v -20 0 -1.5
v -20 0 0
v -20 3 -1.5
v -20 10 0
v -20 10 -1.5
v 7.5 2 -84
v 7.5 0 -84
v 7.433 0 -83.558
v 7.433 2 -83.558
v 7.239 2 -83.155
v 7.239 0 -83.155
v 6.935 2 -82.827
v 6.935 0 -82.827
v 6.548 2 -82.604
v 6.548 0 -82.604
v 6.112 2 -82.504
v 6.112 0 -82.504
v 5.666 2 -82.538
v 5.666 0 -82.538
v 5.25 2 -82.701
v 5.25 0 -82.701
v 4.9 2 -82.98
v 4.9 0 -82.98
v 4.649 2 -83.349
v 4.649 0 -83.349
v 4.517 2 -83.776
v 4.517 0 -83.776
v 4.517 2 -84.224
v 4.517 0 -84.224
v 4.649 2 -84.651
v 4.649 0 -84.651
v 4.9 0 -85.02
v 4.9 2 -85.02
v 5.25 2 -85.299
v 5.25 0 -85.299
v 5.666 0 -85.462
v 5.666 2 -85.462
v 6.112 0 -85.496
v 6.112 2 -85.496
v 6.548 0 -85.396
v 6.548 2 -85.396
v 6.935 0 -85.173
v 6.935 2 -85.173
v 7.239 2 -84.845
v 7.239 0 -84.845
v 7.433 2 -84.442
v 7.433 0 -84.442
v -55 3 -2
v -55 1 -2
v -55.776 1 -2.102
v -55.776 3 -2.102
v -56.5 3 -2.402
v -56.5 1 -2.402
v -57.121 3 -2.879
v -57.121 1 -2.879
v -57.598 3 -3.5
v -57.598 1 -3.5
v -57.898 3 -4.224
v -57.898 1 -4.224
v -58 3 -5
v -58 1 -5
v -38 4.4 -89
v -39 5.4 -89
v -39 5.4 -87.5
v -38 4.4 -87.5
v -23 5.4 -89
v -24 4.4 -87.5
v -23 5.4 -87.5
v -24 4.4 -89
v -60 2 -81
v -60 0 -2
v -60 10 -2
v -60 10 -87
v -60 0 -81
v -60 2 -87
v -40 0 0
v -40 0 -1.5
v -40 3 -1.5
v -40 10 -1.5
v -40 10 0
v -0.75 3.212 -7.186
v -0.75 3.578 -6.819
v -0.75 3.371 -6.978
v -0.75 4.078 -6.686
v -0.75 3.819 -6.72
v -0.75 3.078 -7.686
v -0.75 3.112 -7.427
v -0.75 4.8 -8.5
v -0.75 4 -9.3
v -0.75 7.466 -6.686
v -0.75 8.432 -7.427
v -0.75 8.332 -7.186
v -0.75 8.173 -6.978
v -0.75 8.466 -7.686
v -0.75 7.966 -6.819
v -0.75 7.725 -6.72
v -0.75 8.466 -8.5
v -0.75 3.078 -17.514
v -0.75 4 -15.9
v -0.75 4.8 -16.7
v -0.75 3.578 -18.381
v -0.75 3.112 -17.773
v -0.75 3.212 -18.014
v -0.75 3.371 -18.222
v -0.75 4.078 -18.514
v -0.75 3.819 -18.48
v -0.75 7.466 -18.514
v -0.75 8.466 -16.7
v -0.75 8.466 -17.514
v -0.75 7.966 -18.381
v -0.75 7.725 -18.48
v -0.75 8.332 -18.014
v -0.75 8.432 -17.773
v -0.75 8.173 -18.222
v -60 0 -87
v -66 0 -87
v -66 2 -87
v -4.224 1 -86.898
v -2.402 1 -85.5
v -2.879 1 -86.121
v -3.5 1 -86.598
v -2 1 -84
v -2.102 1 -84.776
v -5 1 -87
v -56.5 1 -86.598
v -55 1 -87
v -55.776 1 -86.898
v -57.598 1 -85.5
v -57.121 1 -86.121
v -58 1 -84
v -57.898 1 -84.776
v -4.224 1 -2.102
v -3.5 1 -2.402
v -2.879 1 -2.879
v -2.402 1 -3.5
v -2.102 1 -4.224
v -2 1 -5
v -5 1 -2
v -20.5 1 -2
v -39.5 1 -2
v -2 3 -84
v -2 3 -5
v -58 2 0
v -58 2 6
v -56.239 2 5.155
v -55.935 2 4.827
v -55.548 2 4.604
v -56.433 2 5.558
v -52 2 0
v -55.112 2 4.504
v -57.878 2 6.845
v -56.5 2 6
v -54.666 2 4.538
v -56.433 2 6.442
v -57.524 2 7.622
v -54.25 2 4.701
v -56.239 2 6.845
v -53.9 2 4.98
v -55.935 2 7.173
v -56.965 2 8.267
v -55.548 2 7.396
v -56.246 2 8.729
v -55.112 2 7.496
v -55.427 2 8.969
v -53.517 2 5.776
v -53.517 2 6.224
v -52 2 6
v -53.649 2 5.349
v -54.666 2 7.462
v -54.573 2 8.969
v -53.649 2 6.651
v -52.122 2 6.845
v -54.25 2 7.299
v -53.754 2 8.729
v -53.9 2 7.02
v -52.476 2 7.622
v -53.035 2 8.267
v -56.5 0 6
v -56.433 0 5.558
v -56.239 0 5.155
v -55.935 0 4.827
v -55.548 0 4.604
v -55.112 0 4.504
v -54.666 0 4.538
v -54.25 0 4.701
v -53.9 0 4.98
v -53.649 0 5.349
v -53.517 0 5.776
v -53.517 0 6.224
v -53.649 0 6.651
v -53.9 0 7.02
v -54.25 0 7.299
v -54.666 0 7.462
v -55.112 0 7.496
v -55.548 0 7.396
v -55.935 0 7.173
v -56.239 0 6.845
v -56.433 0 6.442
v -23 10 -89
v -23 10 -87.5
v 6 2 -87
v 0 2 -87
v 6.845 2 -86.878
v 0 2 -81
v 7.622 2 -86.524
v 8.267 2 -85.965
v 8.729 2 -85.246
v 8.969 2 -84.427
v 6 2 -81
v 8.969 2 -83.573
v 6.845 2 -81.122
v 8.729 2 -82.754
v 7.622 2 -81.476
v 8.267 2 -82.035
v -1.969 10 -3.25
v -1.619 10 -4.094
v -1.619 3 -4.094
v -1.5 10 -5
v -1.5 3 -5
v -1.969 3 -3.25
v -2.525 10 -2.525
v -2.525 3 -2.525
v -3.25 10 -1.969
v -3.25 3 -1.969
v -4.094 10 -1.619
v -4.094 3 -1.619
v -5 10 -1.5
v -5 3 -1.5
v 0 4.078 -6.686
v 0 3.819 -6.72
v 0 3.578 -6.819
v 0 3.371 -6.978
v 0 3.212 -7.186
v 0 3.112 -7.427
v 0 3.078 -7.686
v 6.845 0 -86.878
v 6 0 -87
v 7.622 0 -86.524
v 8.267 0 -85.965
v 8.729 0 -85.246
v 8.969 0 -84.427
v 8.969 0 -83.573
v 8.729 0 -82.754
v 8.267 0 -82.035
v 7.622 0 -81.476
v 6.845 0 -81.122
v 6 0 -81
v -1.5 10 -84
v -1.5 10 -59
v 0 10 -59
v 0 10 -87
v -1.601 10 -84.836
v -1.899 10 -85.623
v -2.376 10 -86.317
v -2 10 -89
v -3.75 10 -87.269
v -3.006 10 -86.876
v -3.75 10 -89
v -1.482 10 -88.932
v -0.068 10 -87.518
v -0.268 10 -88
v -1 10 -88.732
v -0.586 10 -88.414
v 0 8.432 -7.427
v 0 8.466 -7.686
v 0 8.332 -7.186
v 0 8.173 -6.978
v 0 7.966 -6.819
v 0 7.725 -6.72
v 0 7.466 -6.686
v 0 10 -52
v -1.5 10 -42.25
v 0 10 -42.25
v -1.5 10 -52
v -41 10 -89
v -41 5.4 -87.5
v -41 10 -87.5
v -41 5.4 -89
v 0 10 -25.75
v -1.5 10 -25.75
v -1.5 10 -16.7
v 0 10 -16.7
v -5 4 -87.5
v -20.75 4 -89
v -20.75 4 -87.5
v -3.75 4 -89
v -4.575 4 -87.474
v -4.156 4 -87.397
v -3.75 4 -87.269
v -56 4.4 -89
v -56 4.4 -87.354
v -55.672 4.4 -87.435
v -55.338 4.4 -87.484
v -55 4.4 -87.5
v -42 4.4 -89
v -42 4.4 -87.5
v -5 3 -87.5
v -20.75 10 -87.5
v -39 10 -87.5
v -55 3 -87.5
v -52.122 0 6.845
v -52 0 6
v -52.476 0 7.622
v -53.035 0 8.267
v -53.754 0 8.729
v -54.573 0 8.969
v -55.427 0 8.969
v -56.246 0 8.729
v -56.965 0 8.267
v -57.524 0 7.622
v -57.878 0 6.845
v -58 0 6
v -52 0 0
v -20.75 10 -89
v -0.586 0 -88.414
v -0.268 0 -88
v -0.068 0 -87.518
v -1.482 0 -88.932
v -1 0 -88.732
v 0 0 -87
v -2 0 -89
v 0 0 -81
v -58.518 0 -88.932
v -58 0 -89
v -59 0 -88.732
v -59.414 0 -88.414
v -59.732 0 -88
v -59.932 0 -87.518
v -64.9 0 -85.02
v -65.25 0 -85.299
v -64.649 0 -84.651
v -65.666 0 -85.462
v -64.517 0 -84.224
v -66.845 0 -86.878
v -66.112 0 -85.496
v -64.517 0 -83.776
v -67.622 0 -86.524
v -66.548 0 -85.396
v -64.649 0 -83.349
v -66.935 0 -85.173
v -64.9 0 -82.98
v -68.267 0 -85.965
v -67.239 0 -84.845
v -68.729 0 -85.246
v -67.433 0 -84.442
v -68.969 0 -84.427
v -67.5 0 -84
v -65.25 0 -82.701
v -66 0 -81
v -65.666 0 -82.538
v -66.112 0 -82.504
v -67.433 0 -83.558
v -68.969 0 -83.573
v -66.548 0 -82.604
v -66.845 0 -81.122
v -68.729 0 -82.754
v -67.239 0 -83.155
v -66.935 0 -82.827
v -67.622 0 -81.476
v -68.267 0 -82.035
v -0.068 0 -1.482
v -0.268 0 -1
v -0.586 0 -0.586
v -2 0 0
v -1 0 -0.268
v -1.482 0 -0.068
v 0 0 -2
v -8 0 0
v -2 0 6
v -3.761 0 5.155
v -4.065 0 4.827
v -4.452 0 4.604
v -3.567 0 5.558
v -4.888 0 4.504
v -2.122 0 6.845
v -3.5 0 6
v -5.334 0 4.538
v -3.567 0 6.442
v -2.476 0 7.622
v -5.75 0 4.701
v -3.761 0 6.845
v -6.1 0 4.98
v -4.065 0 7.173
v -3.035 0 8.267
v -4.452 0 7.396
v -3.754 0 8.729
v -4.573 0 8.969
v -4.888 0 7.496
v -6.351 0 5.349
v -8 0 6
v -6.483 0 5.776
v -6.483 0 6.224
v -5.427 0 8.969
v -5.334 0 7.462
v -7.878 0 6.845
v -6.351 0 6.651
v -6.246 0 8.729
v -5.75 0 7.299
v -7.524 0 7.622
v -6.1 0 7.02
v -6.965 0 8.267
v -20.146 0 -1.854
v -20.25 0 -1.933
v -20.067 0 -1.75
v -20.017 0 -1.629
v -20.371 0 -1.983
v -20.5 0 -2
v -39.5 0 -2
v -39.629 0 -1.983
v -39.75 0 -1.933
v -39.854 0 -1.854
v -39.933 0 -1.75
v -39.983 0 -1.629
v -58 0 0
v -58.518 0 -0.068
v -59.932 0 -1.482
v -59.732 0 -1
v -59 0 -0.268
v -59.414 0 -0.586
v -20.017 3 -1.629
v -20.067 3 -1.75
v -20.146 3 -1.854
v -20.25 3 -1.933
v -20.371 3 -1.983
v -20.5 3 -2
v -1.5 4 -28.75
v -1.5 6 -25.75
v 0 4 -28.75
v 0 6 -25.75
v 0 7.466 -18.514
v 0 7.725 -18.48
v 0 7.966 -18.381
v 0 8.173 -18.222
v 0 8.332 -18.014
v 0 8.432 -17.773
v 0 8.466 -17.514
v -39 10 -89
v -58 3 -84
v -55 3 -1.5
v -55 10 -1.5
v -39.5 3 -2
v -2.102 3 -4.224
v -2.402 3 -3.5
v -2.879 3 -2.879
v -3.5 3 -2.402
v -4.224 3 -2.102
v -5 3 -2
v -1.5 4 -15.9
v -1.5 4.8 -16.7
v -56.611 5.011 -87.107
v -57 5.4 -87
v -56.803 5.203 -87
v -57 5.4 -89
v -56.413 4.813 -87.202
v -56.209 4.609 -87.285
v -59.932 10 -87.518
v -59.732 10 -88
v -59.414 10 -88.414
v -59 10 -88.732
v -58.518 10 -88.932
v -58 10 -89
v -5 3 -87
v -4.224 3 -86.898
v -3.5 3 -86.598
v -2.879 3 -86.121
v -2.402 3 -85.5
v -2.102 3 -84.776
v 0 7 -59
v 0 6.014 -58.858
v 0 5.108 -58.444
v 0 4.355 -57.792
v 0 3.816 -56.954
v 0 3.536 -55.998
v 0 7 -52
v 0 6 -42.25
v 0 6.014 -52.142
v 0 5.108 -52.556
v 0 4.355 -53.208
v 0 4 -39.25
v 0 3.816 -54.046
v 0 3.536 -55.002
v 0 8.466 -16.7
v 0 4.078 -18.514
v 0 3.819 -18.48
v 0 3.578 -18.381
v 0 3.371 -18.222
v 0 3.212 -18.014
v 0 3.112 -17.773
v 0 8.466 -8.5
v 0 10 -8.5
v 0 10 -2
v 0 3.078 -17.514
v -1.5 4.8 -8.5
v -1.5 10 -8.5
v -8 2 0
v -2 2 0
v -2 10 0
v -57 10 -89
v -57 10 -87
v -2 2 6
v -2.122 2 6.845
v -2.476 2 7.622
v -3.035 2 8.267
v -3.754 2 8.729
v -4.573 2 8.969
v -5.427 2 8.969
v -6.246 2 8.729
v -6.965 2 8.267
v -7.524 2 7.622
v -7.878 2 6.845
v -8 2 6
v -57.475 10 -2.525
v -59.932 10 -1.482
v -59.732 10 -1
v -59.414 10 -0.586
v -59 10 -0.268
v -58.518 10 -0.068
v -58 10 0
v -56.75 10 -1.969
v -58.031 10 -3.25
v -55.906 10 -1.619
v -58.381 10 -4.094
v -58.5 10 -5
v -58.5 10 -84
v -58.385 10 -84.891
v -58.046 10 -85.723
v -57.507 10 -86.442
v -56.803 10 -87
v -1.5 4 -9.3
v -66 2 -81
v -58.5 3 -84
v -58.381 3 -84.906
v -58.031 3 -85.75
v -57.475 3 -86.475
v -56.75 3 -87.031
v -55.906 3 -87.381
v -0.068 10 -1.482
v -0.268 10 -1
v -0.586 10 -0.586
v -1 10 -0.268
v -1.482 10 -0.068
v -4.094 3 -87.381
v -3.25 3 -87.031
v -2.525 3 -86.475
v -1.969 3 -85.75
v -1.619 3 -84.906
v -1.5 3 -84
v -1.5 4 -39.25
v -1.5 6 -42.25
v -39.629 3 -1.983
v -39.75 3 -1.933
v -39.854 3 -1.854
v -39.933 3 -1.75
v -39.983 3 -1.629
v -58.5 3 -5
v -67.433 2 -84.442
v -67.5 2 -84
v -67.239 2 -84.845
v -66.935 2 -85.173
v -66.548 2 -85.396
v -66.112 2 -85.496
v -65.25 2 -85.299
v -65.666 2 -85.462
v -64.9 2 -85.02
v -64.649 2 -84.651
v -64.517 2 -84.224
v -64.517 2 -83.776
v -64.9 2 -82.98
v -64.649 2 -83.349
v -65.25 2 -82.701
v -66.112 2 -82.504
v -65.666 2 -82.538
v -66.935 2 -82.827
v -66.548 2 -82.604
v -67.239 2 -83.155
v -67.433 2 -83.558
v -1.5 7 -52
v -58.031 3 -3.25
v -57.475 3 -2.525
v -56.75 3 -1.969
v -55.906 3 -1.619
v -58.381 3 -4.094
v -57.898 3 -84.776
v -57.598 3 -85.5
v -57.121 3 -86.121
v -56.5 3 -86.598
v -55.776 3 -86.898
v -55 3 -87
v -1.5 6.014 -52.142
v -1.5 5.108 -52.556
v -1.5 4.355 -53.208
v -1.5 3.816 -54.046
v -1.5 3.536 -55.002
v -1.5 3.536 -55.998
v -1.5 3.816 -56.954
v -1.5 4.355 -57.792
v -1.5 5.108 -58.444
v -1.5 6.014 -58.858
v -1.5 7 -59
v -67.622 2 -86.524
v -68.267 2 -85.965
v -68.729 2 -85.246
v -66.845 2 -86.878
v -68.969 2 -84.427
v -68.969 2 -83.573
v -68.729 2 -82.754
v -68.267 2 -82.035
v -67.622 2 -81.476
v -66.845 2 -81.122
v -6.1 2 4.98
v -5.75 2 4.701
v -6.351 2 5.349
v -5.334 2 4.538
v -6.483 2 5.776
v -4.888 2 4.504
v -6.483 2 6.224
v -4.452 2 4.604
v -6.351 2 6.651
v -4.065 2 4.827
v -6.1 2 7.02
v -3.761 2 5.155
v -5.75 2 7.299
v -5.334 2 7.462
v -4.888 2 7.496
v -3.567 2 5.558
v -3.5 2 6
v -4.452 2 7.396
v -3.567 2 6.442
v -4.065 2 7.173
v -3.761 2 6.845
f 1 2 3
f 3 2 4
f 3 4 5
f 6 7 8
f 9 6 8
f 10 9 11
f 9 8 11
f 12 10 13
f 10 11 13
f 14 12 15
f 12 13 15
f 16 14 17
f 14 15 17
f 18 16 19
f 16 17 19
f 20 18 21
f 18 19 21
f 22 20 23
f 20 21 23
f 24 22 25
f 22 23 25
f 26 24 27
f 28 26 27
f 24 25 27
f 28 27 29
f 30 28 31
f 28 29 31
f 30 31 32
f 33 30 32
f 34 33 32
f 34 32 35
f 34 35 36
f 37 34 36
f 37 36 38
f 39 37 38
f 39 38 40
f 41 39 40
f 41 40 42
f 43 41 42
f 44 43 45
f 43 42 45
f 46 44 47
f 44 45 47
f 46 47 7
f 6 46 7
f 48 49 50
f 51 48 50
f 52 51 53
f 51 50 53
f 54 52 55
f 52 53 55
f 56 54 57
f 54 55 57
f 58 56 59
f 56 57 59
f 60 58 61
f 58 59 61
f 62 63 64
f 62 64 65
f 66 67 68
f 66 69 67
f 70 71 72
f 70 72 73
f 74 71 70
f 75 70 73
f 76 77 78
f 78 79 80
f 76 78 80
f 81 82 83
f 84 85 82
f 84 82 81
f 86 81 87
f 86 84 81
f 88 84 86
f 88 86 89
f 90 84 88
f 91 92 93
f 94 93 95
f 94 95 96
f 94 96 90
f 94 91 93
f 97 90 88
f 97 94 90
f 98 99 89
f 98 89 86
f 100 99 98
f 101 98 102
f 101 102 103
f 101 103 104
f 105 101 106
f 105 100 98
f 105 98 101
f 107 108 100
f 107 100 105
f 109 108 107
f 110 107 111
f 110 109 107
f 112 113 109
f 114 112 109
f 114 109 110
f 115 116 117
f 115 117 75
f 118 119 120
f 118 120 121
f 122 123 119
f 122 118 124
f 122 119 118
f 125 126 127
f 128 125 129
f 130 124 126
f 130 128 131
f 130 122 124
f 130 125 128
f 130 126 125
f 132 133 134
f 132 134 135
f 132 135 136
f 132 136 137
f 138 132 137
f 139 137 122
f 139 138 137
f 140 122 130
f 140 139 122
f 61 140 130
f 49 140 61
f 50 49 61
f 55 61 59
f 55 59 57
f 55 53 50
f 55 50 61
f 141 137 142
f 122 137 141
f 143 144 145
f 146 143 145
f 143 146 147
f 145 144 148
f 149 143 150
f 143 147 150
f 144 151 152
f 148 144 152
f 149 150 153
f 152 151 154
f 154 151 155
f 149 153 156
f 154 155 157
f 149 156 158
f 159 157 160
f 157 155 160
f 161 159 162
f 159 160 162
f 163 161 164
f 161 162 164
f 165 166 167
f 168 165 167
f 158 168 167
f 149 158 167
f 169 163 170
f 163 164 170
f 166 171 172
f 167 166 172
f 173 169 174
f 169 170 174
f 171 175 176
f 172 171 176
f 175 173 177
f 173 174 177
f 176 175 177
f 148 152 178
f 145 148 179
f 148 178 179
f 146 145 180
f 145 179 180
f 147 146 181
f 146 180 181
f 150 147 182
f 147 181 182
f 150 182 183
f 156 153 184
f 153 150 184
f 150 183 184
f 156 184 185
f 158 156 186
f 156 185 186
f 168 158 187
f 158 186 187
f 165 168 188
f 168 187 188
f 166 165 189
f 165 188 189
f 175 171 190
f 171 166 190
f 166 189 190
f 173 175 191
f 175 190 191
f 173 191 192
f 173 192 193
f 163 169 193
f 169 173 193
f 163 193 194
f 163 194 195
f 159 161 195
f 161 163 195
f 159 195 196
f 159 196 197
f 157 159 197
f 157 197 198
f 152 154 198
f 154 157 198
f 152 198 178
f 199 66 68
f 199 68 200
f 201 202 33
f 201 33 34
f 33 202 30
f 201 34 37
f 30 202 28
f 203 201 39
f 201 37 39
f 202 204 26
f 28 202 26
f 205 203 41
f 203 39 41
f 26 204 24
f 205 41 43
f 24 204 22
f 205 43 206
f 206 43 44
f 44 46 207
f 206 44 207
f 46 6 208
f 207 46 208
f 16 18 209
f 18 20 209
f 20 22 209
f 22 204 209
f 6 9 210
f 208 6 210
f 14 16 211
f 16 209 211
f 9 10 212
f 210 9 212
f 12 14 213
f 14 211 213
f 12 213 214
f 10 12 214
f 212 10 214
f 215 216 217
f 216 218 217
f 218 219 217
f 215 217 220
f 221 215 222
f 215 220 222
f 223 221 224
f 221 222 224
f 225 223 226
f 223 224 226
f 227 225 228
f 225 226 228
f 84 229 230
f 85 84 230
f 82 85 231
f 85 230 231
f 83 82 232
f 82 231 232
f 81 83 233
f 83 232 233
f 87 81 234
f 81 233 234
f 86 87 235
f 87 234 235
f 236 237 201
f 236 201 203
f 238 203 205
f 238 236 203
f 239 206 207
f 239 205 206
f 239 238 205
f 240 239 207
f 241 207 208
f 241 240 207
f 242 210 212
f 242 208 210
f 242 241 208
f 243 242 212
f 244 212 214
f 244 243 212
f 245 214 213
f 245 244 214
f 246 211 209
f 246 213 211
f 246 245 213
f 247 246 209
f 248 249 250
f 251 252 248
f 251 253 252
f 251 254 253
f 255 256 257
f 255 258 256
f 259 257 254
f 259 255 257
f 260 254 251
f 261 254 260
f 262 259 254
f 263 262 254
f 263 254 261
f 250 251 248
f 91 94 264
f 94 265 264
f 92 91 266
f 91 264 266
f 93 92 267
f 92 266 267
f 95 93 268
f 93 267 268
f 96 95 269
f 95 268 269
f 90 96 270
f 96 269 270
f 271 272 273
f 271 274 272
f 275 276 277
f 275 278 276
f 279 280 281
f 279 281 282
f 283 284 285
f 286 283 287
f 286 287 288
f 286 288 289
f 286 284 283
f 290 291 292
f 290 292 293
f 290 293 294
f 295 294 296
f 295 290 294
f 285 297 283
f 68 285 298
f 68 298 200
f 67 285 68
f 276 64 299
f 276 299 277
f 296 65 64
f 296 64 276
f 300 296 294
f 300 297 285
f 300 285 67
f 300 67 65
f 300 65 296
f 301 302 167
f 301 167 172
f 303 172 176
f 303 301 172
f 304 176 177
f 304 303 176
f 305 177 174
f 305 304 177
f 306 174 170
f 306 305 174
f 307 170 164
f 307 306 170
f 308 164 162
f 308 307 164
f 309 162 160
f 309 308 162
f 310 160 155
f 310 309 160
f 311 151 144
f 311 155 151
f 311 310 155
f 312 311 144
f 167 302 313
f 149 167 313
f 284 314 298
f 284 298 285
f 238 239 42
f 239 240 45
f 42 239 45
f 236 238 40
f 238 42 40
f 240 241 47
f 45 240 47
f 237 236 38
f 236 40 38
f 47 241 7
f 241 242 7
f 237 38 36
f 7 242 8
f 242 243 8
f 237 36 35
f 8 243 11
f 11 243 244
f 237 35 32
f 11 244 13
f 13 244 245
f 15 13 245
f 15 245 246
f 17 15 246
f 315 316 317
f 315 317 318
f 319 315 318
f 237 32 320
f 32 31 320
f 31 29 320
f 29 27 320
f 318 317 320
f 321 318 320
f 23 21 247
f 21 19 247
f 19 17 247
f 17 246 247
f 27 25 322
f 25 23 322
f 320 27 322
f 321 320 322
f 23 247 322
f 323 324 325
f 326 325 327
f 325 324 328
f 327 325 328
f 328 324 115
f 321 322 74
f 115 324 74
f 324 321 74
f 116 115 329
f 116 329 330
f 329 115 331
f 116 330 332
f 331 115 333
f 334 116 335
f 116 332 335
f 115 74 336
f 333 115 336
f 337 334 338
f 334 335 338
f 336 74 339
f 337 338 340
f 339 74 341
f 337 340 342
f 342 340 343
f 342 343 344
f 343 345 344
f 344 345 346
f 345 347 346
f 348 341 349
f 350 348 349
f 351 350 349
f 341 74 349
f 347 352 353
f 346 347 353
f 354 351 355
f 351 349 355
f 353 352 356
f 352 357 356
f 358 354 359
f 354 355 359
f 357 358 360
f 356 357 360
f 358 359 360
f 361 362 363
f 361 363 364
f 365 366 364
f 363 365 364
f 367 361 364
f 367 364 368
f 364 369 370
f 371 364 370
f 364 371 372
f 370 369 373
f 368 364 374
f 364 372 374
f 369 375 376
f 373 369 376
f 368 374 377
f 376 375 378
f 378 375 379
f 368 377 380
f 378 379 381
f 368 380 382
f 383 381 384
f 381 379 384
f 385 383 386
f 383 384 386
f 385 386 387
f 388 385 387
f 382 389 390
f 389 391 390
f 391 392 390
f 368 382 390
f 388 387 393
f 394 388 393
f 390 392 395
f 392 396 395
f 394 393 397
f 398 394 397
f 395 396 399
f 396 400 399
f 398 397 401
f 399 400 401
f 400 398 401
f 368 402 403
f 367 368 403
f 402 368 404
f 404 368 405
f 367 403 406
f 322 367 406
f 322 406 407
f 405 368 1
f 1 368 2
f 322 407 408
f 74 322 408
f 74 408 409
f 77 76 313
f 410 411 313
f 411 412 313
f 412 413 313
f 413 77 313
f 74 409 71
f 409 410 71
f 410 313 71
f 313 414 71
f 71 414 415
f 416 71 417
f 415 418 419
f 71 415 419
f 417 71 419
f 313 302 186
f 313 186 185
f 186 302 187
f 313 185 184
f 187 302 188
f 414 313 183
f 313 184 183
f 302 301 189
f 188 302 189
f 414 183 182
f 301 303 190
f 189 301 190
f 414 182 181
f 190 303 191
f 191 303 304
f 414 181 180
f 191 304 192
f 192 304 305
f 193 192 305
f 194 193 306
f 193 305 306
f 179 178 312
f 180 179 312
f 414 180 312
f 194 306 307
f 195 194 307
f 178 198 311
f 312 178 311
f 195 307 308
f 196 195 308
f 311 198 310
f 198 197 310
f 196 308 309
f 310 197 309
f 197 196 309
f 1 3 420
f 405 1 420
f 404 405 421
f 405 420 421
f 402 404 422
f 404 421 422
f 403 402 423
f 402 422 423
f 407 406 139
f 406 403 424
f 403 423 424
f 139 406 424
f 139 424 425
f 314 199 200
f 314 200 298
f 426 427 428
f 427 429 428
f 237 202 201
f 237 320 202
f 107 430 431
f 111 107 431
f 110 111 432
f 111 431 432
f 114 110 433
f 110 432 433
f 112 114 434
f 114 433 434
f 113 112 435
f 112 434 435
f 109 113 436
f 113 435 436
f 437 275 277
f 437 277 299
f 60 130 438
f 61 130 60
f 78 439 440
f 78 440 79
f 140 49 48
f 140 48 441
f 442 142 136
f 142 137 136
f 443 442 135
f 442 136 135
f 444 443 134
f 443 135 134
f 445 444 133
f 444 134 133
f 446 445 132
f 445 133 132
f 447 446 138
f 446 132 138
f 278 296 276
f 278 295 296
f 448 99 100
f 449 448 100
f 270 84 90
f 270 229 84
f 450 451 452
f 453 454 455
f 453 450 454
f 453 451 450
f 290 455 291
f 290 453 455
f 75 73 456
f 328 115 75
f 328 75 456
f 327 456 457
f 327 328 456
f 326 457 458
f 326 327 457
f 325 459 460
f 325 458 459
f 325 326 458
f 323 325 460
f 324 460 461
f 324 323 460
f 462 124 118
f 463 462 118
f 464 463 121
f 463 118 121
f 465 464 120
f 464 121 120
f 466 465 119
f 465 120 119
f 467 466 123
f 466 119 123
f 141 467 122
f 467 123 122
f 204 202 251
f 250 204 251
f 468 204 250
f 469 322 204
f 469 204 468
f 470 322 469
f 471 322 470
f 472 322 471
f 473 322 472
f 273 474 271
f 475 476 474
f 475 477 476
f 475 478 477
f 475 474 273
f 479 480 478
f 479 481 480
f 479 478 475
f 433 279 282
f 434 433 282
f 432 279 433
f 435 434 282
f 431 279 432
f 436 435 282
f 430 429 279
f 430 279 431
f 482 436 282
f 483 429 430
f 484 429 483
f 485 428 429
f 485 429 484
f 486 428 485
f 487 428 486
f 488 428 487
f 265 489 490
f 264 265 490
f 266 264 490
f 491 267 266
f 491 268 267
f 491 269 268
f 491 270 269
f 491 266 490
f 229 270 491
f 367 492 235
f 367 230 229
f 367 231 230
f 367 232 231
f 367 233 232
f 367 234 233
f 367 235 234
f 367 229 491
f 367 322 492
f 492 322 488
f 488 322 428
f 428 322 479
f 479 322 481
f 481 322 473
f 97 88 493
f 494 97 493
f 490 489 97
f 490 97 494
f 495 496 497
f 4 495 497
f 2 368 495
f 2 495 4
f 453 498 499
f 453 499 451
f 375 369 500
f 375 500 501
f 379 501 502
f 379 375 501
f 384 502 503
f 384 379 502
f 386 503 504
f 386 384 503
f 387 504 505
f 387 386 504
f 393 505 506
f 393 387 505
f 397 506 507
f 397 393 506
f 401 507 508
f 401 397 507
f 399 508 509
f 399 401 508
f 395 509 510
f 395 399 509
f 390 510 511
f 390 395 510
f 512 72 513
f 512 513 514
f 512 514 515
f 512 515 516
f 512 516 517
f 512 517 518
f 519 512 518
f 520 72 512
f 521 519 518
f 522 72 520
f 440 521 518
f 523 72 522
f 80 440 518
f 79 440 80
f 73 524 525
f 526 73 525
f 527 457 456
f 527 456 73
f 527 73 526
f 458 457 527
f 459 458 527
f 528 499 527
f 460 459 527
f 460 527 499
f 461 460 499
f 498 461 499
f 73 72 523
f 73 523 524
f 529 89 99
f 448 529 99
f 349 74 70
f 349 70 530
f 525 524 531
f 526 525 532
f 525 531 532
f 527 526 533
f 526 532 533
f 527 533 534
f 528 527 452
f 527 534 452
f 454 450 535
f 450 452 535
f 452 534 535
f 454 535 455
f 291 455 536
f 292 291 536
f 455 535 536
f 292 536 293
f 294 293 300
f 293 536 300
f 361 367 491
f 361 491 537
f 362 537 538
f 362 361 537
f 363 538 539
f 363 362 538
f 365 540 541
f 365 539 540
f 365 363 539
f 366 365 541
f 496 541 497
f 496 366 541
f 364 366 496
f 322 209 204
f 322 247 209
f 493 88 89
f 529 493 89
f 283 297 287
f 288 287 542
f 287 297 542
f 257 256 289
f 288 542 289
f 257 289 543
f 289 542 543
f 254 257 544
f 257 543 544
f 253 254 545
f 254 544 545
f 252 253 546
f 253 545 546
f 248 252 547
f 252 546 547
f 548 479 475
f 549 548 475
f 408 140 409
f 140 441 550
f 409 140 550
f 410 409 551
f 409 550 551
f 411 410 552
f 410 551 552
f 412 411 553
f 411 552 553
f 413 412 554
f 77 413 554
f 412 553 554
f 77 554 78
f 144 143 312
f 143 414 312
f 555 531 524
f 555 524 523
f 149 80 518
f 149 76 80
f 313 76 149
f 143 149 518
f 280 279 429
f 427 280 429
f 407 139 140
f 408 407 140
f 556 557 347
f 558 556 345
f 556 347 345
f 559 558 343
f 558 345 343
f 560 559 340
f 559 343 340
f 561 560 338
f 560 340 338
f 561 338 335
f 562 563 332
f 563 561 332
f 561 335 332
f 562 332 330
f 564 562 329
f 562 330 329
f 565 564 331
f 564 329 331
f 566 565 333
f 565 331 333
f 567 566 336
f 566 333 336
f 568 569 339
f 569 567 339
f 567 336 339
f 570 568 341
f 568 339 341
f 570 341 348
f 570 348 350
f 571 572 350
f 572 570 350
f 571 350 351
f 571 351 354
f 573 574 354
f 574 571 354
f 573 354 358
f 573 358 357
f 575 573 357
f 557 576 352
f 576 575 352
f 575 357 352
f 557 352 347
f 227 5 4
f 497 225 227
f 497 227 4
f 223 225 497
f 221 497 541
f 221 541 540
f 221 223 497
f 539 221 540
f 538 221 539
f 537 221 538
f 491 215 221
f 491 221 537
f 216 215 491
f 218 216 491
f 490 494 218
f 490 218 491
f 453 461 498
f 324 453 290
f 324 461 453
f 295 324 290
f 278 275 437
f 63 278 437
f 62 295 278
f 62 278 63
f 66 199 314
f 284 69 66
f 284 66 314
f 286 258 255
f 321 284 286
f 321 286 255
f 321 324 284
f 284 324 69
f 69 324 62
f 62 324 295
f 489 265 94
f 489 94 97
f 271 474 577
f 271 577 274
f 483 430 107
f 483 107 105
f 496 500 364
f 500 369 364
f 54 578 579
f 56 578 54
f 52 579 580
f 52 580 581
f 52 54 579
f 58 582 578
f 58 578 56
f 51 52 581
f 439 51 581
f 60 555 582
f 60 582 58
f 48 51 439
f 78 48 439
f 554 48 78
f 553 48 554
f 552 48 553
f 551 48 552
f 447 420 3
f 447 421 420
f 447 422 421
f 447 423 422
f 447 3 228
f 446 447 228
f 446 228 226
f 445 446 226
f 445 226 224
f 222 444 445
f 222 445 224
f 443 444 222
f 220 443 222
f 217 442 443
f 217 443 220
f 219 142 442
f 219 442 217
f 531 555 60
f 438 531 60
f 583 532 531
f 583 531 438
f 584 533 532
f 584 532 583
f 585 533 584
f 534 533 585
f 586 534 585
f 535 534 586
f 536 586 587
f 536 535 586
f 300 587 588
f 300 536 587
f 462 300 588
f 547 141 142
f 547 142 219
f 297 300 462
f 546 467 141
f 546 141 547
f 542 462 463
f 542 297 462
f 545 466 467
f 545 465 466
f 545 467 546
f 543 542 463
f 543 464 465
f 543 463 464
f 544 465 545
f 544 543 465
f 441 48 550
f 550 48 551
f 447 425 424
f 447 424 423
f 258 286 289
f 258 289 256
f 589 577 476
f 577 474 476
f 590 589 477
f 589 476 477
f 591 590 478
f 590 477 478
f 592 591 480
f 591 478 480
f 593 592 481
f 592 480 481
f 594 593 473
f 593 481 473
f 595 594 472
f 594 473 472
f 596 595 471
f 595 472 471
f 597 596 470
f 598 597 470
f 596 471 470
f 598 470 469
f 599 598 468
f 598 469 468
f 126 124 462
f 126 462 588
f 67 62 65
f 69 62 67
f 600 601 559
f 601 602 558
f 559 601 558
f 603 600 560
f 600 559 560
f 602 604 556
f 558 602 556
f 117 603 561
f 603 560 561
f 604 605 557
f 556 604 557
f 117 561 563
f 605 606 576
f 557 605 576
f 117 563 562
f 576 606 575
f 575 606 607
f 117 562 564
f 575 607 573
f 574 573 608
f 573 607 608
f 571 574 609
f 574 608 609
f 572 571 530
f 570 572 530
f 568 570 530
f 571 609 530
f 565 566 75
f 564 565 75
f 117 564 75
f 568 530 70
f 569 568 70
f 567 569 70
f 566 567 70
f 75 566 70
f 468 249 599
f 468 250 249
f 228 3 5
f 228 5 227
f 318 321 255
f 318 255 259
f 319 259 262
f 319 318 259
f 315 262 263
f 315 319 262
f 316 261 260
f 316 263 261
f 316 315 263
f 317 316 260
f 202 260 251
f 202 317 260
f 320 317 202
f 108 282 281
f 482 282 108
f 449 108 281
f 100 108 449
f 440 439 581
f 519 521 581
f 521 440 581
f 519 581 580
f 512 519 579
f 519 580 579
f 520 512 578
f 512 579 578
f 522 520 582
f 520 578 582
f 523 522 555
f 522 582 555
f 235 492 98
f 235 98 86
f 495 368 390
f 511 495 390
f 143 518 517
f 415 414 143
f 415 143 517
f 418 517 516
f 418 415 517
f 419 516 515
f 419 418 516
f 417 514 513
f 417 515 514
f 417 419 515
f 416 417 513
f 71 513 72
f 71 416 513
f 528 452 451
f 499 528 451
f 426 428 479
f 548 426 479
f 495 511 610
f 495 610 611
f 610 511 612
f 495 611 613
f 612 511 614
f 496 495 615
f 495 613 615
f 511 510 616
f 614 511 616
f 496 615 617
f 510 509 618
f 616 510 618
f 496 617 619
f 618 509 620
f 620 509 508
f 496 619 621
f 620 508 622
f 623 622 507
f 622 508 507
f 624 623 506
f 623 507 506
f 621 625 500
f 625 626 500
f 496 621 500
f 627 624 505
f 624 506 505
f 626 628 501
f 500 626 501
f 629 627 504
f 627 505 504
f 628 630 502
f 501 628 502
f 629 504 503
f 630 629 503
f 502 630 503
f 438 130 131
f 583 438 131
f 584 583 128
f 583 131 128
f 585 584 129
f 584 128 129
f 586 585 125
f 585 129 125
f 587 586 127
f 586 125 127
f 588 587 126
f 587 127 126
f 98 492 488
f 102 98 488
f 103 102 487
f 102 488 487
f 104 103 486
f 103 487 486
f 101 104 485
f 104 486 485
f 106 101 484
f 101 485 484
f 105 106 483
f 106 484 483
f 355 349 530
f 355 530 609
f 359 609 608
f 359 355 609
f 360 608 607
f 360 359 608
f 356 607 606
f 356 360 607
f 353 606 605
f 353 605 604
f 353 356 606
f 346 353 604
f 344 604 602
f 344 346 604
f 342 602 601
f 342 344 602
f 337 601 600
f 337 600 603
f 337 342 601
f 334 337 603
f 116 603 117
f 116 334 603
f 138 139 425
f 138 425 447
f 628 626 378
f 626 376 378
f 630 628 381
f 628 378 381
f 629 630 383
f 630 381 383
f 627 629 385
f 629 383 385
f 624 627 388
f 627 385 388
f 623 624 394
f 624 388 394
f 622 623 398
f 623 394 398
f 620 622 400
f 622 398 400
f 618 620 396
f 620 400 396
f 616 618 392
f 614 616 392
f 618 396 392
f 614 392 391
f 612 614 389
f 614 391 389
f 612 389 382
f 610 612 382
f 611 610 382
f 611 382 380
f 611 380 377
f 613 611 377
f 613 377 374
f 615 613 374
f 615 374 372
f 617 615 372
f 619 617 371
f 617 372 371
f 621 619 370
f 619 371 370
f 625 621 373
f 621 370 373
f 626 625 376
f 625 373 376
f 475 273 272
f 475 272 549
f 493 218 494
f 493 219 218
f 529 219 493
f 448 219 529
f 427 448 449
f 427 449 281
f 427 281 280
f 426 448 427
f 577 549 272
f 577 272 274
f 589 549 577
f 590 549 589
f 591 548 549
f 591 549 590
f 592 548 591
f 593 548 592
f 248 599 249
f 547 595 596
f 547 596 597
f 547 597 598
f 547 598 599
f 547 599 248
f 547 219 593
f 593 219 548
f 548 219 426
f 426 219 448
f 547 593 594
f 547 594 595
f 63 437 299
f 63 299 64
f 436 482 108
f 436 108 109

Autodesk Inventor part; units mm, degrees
ref_plane "YZ Plane" through (0, 0, 0) normal (1, 0, 0) x (0, 1, 0)
ref_plane "XZ Plane" through (0, 0, 0) normal (0, 1, 0) x (-1, 0, 0)
sketch "Sketch1" plane through (0, 0, 0) normal (0, 1, 0) x (-1, 0, 0)
  line L0 (2, 0) -> (58, 0)
  line L1 (60, -2) -> (60, -87)
  line L2 (58, -89) -> (2, -89)
  line L3 (0, -87) -> (0, -2)
  arc A0 (60, -2) -> (58, 0) centre (58, -2) ccw
  arc A1 (2, 0) -> (0, -2) centre (2, -2) ccw
  arc A2 (58, -89) -> (60, -87) centre (58, -87) ccw
  arc A3 (0, -87) -> (2, -89) centre (2, -87) ccw
  point P0 (0, 0)
  point P1 (60, 0)
  point P2 (0, -89)
  dimension "d0" = 89
  dimension "d1" = 60
  dimension "d2" = 2
extrude "Extrusion1" add sketch "Sketch1" along normal blind 1
sketch "Sketch2" plane through (0, 1, 0) normal (0, 1, 0) x (1, 0, 0)
  line L0 (-60, 87) -> (-60, 2) projected
  line L1 (-58, 0) -> (-2, 0) projected
  line L2 (0, 2) -> (0, 87) projected
  line L3 (-2, 89) -> (-58, 89) projected
  line L4 (-2, 0) -> (-58, 0)
  line L5 (-60, 2) -> (-60, 87)
  line L6 (-58, 89) -> (-2, 89)
  line L7 (0, 87) -> (0, 2)
  arc A0 (-58, 89) -> (-60, 87) centre (-58, 87) ccw
  arc A1 (-60, 2) -> (-58, 0) centre (-58, 2) ccw
  arc A2 (-2, 0) -> (0, 2) centre (-2, 2) ccw
  arc A3 (0, 87) -> (-2, 89) centre (-2, 87) ccw
  line L8 (-55, 1.5) -> (-5, 1.5)
  line L9 (-1.5, 5) -> (-1.5, 84)
  line L10 (-5, 87.5) -> (-55, 87.5)
  line L11 (-58.5, 84) -> (-58.5, 5)
  arc A4 (-5, 1.5) -> (-1.5, 5) centre (-5, 5) ccw
  arc A5 (-58.5, 5) -> (-55, 1.5) centre (-55, 5) ccw
  arc A6 (-55, 87.5) -> (-58.5, 84) centre (-55, 84) ccw
  arc A7 (-1.5, 84) -> (-5, 87.5) centre (-5, 84) ccw
  point P0 (0, 0)
  point P1 (-60, 89)
  point P2 (-30, 89)
  point P3 (-2, 0)
  dimension "d5" = 2
  dimension "d6" = 1.5
  dimension "d7" = 1.5
  dimension "d8" = 1.5
  dimension "d9" = 1.5
  dimension "d10" = 3.5
extrude "Extrusion2" add sketch "Sketch2" along normal blind 9
sketch "Sketch4" plane through (0, 1, 0) normal (0, 1, 0) x (1, 0, 0)
  line L0 (-55, 1.5) -> (-5, 1.5)
  line L1 (-1.5, 5) -> (-1.5, 84)
  line L2 (-5, 87.5) -> (-55, 87.5)
  line L3 (-58.5, 84) -> (-58.5, 5)
  line L4 (-58.5, 5) -> (-58.5, 84) projected
  line L5 (-5, 1.5) -> (-55, 1.5) projected
  line L6 (-1.5, 84) -> (-1.5, 5) projected
  line L7 (-55, 87.5) -> (-5, 87.5) projected
  arc A0 (-55, 87.5) -> (-58.5, 84) centre (-55, 84) ccw
  arc A1 (-58.5, 5) -> (-55, 1.5) centre (-55, 5) ccw
  arc A2 (-5, 1.5) -> (-1.5, 5) centre (-5, 5) ccw
  arc A3 (-1.5, 84) -> (-5, 87.5) centre (-5, 84) ccw
  line L8 (-55, 2) -> (-5, 2)
  line L9 (-2, 5) -> (-2, 84)
  line L10 (-5, 87) -> (-55, 87)
  line L11 (-58, 84) -> (-58, 5)
  arc A4 (-58, 5) -> (-55, 2) centre (-55, 5) ccw
  arc A5 (-5, 2) -> (-2, 5) centre (-5, 5) ccw
  arc A6 (-2, 84) -> (-5, 87) centre (-5, 84) ccw
  arc A7 (-55, 87) -> (-58, 84) centre (-55, 84) ccw
  point P0 (0, 0)
  dimension "d13" = 3.5
  dimension "d14" = 0.5
  dimension "d15" = 0.5
  dimension "d16" = 0.5
  dimension "d17" = 0.5
  dimension "d18" = 3
  dimension "d19" = 3
extrude "Extrusion3" add sketch "Sketch4" along normal blind 2
sketch "Sketch5" plane through (0, 10, 0) normal (0, 1, 0) x (1, 0, 0)
  line L0 (-40, 0) -> (-20, 0)
  line L1 (-20, 0) -> (-20, 1.5)
  line L2 (-20.5, 2) -> (-39.5, 2)
  line L3 (-40, 1.5) -> (-40, 0)
  arc A0 (-39.5, 2) -> (-40, 1.5) centre (-39.5, 1.5) ccw
  arc A1 (-20, 1.5) -> (-20.5, 2) centre (-20.5, 1.5) ccw
  line L4 (-30, 0) -> (-30, 2) construction
  line L5 (-58, 0) -> (-2, 0) construction
  line L6 (-30, 0) -> (-30, 1.5) construction
  line L7 (-5, 1.5) -> (-55, 1.5) construction
  line L8 (-58, 0) -> (-2, 0) construction
  point P0 (0, 0)
  point P1 (-40, 2)
  dimension "d22" = 2
  dimension "d23" = 20
  dimension "d24" = 0.5
extrude "Extrusion4" cut sketch "Sketch5" against normal up to surface (10 mm away)
sketch "Sketch6" plane through (0, 0, -2) normal (1, 0, 0) x (0, 0, -1)
  line L0 (23.75, 10) -> (40.25, 10)
  line L1 (40.25, 10) -> (40.25, 6)
  line L2 (3, 3) -> (82, 3) projected
  line L3 (23.75, 10) -> (23.75, 6)
  line L4 (23.75, 6) -> (26.75, 4)
  line L5 (26.75, 4) -> (37.25, 4)
  line L6 (37.25, 4) -> (40.25, 6)
  line L7 (32, 10) -> (32, 4) construction
  line L8 (0, 10) -> (85, 10) construction
  line L9 (-2, 0) -> (-2, 10) construction
  dimension "d27" = 16.5
  dimension "d28" = 4
  dimension "d29" = 10.5
  dimension "d30" = 6
  dimension "d31" = 25.75
extrude "Extrusion5" cut sketch "Sketch6" against normal up to surface (1.5 mm away)
sketch "Sketch7" plane through (0, 0, -2) normal (1, 0, 0) x (0, 0, -1)
  line L0 (50, 10) -> (57, 10)
  line L1 (57, 10) -> (57, 7)
  line L2 (57, 7) -> (50, 7)
  line L3 (50, 7) -> (50, 10)
  line L4 (40.25, 10) -> (85, 10) projected
  arc A0 (50, 7) -> (57, 7) centre (53.5, 7) ccw
  line L5 (40.25, 10) -> (40.25, 6) projected
  point P0 (-2, 0)
  dimension "d34" = 7
  dimension "d35" = 3
  dimension "d36" = 9.75
extrude "Extrusion6" cut sketch "Sketch7" against normal up to surface (1.5 mm away)
sketch "Sketch8" plane through (0, 0, -2) normal (1, 0, 0) x (0, 0, -1)
  line L0 (6.5, 10) -> (14.7, 10)
  line L1 (14.7, 10) -> (14.7, 4.8)
  line L2 (14.7, 4.8) -> (6.5, 4.8)
  line L3 (6.5, 4.8) -> (6.5, 10)
  line L4 (6.5, 4.8) -> (7.3, 4)
  line L5 (7.3, 4) -> (13.9, 4)
  line L6 (13.9, 4) -> (14.7, 4.8)
  line L7 (0, 10) -> (23.75, 10) projected
  line L8 (23.75, 6) -> (23.75, 10) projected
  point P0 (-2, 0)
  point P1 (10.6, 4)
  dimension "d39" = 8.2
  dimension "d40" = 5.2
  dimension "d41" = 6.6
  dimension "d42" = 6
  dimension "d43" = 9.05
extrude "Extrusion7" cut sketch "Sketch8" against normal up to surface (1.5 mm away)
sketch "Sketch9" plane through (0, 0, -2) normal (1, 0, 0) x (0, 0, -1)
  line L0 (5.6855, 8.466) -> (15.5145, 8.466)
  line L1 (16.5145, 7.466) -> (16.5145, 4.078)
  line L2 (15.5145, 3.078) -> (5.6855, 3.078)
  line L3 (4.6855, 4.078) -> (4.6855, 7.466)
  arc A0 (5.6855, 8.466) -> (4.6855, 7.466) centre (5.6855, 7.466) ccw
  arc A1 (4.6855, 4.078) -> (5.6855, 3.078) centre (5.6855, 4.078) ccw
  arc A2 (15.5145, 3.078) -> (16.5145, 4.078) centre (15.5145, 4.078) ccw
  arc A3 (16.5145, 7.466) -> (15.5145, 8.466) centre (15.5145, 7.466) ccw
  line L4 (13.9, 4) -> (7.3, 4) projected
  line L5 (16.5145, 5.772) -> (14.7, 5.772) construction
  line L6 (14.7, 4.8) -> (14.7, 10) construction
  line L7 (4.6855, 5.772) -> (6.5, 5.772) construction
  line L8 (6.5, 10) -> (6.5, 4.8) construction
  point P0 (-2, 0)
  dimension "d46" = 5.388
  dimension "d47" = 11.829
  dimension "d48" = 1
  dimension "d49" = 0.922
extrude "Extrusion8" cut sketch "Sketch9" against normal blind 0.75
sketch "Sketch10" plane through (-2, 0, -89) normal (0, 0, -1) x (-1, 0, 0)
  line L0 (1.75, 10) -> (18.75, 10)
  line L1 (18.75, 10) -> (18.75, 4)
  line L2 (18.75, 4) -> (1.75, 4)
  line L3 (1.75, 4) -> (1.75, 10)
  line L4 (0, 10) -> (56, 10) projected
  line L5 (-2, 0) -> (-2, 10) projected
  dimension "d52" = 17
  dimension "d53" = 6
  dimension "d54" = 3.75
extrude "Extrusion9" cut sketch "Sketch10" against normal blind 2
sketch "Sketch11" plane through (-2, 0, -89) normal (0, 0, -1) x (-1, 0, 0)
  line L0 (21, 10) -> (37, 10)
  line L1 (37, 10) -> (37, 5.4)
  line L2 (37, 5.4) -> (36, 4.4)
  line L3 (36, 4.4) -> (22, 4.4)
  line L4 (22, 4.4) -> (21, 5.4)
  line L5 (21, 5.4) -> (21, 10)
  line L6 (29, 10) -> (29, 4.4) construction
  line L7 (18.75, 10) -> (56, 10) construction
  line L8 (18.75, 10) -> (18.75, 4) construction
  line L9 (55, 10) -> (55, 5.4)
  line L10 (39, 10) -> (55, 10)
  line L11 (39, 5.4) -> (39, 10)
  line L12 (40, 4.4) -> (39, 5.4)
  line L13 (54, 4.4) -> (40, 4.4)
  line L14 (55, 5.4) -> (54, 4.4)
  line L15 (37, 20) -> (37, 15.4)
  line L16 (21, 20) -> (37, 20)
  line L17 (21, 15.4) -> (21, 20)
  line L18 (22, 14.4) -> (21, 15.4)
  line L19 (36, 14.4) -> (22, 14.4)
  line L20 (37, 15.4) -> (36, 14.4)
  line L21 (55, 20) -> (55, 15.4)
  line L22 (39, 20) -> (55, 20)
  line L23 (39, 15.4) -> (39, 20)
  line L24 (40, 14.4) -> (39, 15.4)
  line L25 (54, 14.4) -> (40, 14.4)
  line L26 (55, 15.4) -> (54, 14.4)
  point P0 (-2, 0)
  point P1 (47, 10)
  point P2 (47, 4.4)
  point P3 (29, 20)
  point P4 (29, 14.4)
  point P5 (47, 20)
  point P6 (47, 14.4)
  dimension "d57" = 16
  dimension "d58" = 14
  dimension "d59" = 4.6
  dimension "d60" = 5.6
  dimension "d61" = 2.25
  dimension "d64" = 18
  dimension "d67" = 10
extrude "Extrusion10" cut sketch "Sketch11" against normal blind 2 contours L0 L1 L2 L3 L4 L5 | L9 L14 L13 L12 L11 L10
sketch "Sketch12" plane through (0, 0, 0) normal (0, -1, 0) x (1, 0, 0)
  arc A0 (0, -2) -> (-2, 0) centre (-2, -2) ccw projected
  line L0 (-2, 0) -> (-8, 0)
  line L1 (-8, 0) -> (-8, 6)
  line L2 (-8, 6) -> (-2, 6)
  line L3 (-2, 6) -> (-2, 0)
  circle A1 centre (-5, 6) radius 3
  circle A2 centre (-5, 6) radius 1.5
  arc A3 (-2, -89) -> (0, -87) centre (-2, -87) ccw projected
  line L4 (0, -87) -> (6, -87)
  line L5 (6, -87) -> (6, -81)
  line L6 (6, -81) -> (0, -81)
  line L7 (0, -81) -> (0, -87)
  circle A4 centre (6, -84) radius 3
  circle A5 centre (6, -84) radius 1.5
  point P0 (0, 0)
  dimension "d72" = 6
  dimension "d75" = 6
  dimension "d73" = 6
  dimension "d74" = 3
  dimension "d76" = 6
  dimension "d77" = 3
extrude "Extrusion11" add sketch "Sketch12" against normal blind 2 contours L0 L1 A1 L3 | A1 L2 A2 | L2 A2 A1 | L7 L6 A4 L4 | A4 L5 A5 | L5 A5 A4
ref_plane "Work Plane1" through (-30, 0, -2) normal (1, 0, 0) x (0, 0, -1)
mirror "Mirror1" about plane through (-30, 0, -2) normal (1, 0, 0) of "Extrusion11"
properties part number "raspi_enclosure"
